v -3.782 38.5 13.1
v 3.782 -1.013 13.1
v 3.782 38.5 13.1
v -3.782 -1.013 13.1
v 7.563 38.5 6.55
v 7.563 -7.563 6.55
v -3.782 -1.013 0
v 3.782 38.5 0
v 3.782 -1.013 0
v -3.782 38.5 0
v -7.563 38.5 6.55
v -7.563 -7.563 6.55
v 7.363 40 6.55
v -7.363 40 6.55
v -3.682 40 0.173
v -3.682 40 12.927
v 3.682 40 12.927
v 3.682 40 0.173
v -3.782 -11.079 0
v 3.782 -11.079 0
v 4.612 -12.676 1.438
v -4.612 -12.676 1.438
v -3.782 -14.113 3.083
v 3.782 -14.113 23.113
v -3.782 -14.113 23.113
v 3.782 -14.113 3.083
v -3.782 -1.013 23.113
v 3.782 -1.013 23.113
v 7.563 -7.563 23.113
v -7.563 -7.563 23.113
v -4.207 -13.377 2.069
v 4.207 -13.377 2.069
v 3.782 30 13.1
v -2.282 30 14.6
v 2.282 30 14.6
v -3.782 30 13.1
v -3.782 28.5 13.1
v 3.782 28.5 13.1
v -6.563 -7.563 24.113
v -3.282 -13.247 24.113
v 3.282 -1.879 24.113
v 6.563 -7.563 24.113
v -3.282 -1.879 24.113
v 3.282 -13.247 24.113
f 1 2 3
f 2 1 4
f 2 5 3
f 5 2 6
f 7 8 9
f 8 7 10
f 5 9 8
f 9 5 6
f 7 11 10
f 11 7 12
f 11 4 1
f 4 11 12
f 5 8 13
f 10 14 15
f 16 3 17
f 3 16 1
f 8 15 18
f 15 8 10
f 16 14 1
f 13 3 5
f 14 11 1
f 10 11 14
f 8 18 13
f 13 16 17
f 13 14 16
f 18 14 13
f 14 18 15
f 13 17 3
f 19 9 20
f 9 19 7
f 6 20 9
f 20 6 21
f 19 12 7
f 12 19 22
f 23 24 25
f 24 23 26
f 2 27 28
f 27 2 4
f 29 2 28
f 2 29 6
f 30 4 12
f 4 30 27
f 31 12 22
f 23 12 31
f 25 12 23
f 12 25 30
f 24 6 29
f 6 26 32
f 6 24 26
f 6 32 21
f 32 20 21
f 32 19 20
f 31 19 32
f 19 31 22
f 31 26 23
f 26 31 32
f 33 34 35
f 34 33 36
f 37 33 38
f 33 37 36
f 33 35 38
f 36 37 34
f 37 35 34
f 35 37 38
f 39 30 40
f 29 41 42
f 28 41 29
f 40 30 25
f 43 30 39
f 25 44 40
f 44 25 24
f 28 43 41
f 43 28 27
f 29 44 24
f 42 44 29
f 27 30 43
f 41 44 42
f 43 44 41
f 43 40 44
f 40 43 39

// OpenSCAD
dual_hook = false;
dual_distance = 10;
dual_base = 5;
dual_width = 5;
dual_height = 10;


hook_length = 30;
hook_height = 10;

clearance_diff = 0.0; // 0.01
tip_length = 1.5; // 0.1
tip_diff = 0.2; // 0.01

stopper_height = 1.5; // 0.1

top_diff = 1.0; // 0.1

/* [Hidden] */

L_GRID = 42.0;

// height: 13.4 - 0.3
STANDARD_HEIGHT = 13.1;

// distance between two horizontal hexagons
H_DISTANCE = 40.88;

GH_DIFF = L_GRID - H_DISTANCE;
PLUG_LENGTH = 10;

module hswPlug(
    clearance_diff = 0.0,
    tip_length = 1.5,
    tip_diff = 0.2,
    height = STANDARD_HEIGHT,
    length = PLUG_LENGTH,
    align_rtl = false
) {
    hsw_h = height - clearance_diff;
    z = hsw_h/2;
    r = z/cos(30);
    main_length = length - tip_length;
    rotate_angle = align_rtl ? 90: -90;
    translate([0, 0, z])
    rotate([rotate_angle, 0, 0]) {
        cylinder(h=main_length, r=r, $fn=6);
        translate([0, 0, main_length])
            cylinder(h=tip_length, r1= r, r2 = r-tip_diff, $fn=6);
    }

}

module bendingPart(radius) {
    rotate_extrude(angle=90) {
        translate([radius,0, 0])
        rotate([0, 0, 90])
        circle(r = radius, $fn=6);
    }
}


module hswHook(
    clearance_diff = 0.0,
    tip_length = 1.5,
    tip_diff = 0.2,
    stopper_height = 0.5,
    hook_length = 30,
    hook_height = 10,
    top_diff = 2.0
){
    hsw_h = STANDARD_HEIGHT - clearance_diff;
    z = hsw_h/2;
    r = z/cos(30);
    translate([0, -r, 0])
    hswPlug(
        clearance_diff = clearance_diff,
        tip_length = tip_length,
        tip_diff = tip_diff,
        length = PLUG_LENGTH + hook_length + r
    );
    

    
    // insert stopper
    l = r*sin(30);
    stopper_points = [
        [-l, 0, 0], 
        [-l+stopper_height, 0, stopper_height],
        [l-stopper_height, 0, stopper_height],
        [l, 0, 0],
        [l, -stopper_height, 0],
        [-l, -stopper_height, 0]
    ];
    stopper_faces = [[0, 3, 2, 1], [0, 5, 4, 3], [0,1,5], [2,3,4], [1,2,4,5]];
    translate([0, hook_length, hsw_h])
    polyhedron(points = stopper_points, faces = stopper_faces);


    // hook top
    translate([0, -r, z])
    cylinder(h = hook_height+r-top_diff, r=r, $fn=6);
    translate([0, -r, z + hook_height+r-top_diff])
    cylinder(h = top_diff, r1 = r, r2 = r-top_diff, $fn=6);
    
    // connecting parts
    intersection() {
        translate([0, -r-z, 0])
        hswPlug(
            clearance_diff = clearance_diff,
            tip_length = 0,
            tip_diff = 0,
            length = PLUG_LENGTH + hook_length + r + z
        );
        translate([0, -r, 0])
        cylinder(h = hook_height+r+z, r=r, $fn=6);
        
        translate([-20, 0, r+z])
        rotate([0,90,0])
        cylinder(h = r+z+40, r = 18);
    }
}

module hswDualHook(
    dual_distance = 10.0,
    dual_base = 5.0,
    dual_width = 5.0,
    dual_height = 10.0,
    clearance_diff = 0.0,
    tip_length = 1.5,
    tip_diff = 0.2,
    stopper_height = 0.5,
    hook_length = 30,
    hook_height = 10,
    top_diff = 2.0
){
    hsw_h = STANDARD_HEIGHT - clearance_diff;
    z = hsw_h/2;
    r = z/cos(30);

    hswPlug(
        clearance_diff = clearance_diff,
        tip_length = tip_length,
        tip_diff = tip_diff,
        length = PLUG_LENGTH
    );
    
    // base
    dual_base_width = dual_width*2+dual_distance;
    
    translate([-dual_base_width/2, -dual_base, 0])
    cube([dual_base_width, dual_base, dual_height]);
    
    // hook
    translate([dual_distance/2, -hook_length-dual_base,0])
    cube([dual_width, hook_length, dual_height]);
    
    translate([-dual_width-dual_distance/2, -hook_length-dual_base,0])
    cube([dual_width, hook_length, dual_height]);
    
    // top
    translate([dual_distance/2, -hook_length-dual_base-dual_height, 0])
    cube([dual_width, dual_height, dual_height+hook_height]);
    
    translate([-dual_width-dual_distance/2, -hook_length-dual_base-dual_height, 0])
    cube([dual_width, dual_height, dual_height+hook_height]);
}


if (dual_hook) {
    hswDualHook(
        dual_distance = dual_distance,
        dual_base = dual_base,
        dual_width = dual_width,
        dual_height = dual_height,
        clearance_diff = clearance_diff,
        tip_length = tip_length,
        tip_diff = tip_diff,
        stopper_height = stopper_height,
        hook_length = hook_length,
        hook_height = hook_height,
        top_diff = top_diff
    );
} else {
    hswHook(
        clearance_diff = clearance_diff,
        tip_length = tip_length,
        tip_diff = tip_diff,
        stopper_height = stopper_height,
        hook_length = hook_length,
        hook_height = hook_height,
        top_diff = top_diff
    );
}


module hswPlugArray(
    gridx, gridy, 
    align = false,
    align_rtl = false,
    align_offset = 0.0,
    align_n_grid = 0.0,
    plug_tolerance = 8.0,
    clearance_diff = 0.0,
    tip_length = 1.5,
    tip_diff = 0.2
) {
    base_start_x = - gridx * L_GRID / 2;
    base_end_x = -base_start_x;
    x_lower = base_start_x + plug_tolerance;
    x_upper = -x_lower;
    centered_start_x = - (gridx-1) * H_DISTANCE / 2;

    offset = align_offset + align_n_grid * L_GRID % H_DISTANCE;
    echo(str("offset: ", offset));
    align_start_x = base_start_x - offset + H_DISTANCE;
    
    start_x = align ? align_start_x : centered_start_x;
    //echo(str("start_x: ", start_x));
    align_sign = align_rtl ? -1 : 1;
    y = align_sign * gridy * L_GRID / 2;
    for(i = [0: gridx]) {
        x = start_x + i * H_DISTANCE;
        if (x_lower<x && x<x_upper) {
            translate([x, y, 0])
                hswPlug(
                    clearance_diff=clearance_diff,
                    tip_length=tip_length, 
                    tip_diff=tip_diff,
                    align_rtl=align_rtl
                );
        }
    } 
}

//module testPlugArray(align_rtl = false) {
//    hswPlugArray(10,1, align_rtl=align_rtl);
//    hswPlugArray(10,2, align_rtl=align_rtl, align=true);
//    hswPlugArray(10,3, align_rtl=align_rtl, align=true, align_offset=20.44);
//    hswPlugArray(10,4, align_rtl=align_rtl, align=true, align_n_grid=5);
//
//    hswPlugArray(11,11, align_rtl=align_rtl);
//    hswPlugArray(11,12, align_rtl=align_rtl, align=true);
//    hswPlugArray(11,13, align_rtl=align_rtl, align=true, align_offset=20.44);
//    hswPlugArray(11,14, align_rtl=align_rtl, align=true, align_n_grid=5);
//}
//color("red") testPlugArray(false);
//color("blue") testPlugArray(true);
